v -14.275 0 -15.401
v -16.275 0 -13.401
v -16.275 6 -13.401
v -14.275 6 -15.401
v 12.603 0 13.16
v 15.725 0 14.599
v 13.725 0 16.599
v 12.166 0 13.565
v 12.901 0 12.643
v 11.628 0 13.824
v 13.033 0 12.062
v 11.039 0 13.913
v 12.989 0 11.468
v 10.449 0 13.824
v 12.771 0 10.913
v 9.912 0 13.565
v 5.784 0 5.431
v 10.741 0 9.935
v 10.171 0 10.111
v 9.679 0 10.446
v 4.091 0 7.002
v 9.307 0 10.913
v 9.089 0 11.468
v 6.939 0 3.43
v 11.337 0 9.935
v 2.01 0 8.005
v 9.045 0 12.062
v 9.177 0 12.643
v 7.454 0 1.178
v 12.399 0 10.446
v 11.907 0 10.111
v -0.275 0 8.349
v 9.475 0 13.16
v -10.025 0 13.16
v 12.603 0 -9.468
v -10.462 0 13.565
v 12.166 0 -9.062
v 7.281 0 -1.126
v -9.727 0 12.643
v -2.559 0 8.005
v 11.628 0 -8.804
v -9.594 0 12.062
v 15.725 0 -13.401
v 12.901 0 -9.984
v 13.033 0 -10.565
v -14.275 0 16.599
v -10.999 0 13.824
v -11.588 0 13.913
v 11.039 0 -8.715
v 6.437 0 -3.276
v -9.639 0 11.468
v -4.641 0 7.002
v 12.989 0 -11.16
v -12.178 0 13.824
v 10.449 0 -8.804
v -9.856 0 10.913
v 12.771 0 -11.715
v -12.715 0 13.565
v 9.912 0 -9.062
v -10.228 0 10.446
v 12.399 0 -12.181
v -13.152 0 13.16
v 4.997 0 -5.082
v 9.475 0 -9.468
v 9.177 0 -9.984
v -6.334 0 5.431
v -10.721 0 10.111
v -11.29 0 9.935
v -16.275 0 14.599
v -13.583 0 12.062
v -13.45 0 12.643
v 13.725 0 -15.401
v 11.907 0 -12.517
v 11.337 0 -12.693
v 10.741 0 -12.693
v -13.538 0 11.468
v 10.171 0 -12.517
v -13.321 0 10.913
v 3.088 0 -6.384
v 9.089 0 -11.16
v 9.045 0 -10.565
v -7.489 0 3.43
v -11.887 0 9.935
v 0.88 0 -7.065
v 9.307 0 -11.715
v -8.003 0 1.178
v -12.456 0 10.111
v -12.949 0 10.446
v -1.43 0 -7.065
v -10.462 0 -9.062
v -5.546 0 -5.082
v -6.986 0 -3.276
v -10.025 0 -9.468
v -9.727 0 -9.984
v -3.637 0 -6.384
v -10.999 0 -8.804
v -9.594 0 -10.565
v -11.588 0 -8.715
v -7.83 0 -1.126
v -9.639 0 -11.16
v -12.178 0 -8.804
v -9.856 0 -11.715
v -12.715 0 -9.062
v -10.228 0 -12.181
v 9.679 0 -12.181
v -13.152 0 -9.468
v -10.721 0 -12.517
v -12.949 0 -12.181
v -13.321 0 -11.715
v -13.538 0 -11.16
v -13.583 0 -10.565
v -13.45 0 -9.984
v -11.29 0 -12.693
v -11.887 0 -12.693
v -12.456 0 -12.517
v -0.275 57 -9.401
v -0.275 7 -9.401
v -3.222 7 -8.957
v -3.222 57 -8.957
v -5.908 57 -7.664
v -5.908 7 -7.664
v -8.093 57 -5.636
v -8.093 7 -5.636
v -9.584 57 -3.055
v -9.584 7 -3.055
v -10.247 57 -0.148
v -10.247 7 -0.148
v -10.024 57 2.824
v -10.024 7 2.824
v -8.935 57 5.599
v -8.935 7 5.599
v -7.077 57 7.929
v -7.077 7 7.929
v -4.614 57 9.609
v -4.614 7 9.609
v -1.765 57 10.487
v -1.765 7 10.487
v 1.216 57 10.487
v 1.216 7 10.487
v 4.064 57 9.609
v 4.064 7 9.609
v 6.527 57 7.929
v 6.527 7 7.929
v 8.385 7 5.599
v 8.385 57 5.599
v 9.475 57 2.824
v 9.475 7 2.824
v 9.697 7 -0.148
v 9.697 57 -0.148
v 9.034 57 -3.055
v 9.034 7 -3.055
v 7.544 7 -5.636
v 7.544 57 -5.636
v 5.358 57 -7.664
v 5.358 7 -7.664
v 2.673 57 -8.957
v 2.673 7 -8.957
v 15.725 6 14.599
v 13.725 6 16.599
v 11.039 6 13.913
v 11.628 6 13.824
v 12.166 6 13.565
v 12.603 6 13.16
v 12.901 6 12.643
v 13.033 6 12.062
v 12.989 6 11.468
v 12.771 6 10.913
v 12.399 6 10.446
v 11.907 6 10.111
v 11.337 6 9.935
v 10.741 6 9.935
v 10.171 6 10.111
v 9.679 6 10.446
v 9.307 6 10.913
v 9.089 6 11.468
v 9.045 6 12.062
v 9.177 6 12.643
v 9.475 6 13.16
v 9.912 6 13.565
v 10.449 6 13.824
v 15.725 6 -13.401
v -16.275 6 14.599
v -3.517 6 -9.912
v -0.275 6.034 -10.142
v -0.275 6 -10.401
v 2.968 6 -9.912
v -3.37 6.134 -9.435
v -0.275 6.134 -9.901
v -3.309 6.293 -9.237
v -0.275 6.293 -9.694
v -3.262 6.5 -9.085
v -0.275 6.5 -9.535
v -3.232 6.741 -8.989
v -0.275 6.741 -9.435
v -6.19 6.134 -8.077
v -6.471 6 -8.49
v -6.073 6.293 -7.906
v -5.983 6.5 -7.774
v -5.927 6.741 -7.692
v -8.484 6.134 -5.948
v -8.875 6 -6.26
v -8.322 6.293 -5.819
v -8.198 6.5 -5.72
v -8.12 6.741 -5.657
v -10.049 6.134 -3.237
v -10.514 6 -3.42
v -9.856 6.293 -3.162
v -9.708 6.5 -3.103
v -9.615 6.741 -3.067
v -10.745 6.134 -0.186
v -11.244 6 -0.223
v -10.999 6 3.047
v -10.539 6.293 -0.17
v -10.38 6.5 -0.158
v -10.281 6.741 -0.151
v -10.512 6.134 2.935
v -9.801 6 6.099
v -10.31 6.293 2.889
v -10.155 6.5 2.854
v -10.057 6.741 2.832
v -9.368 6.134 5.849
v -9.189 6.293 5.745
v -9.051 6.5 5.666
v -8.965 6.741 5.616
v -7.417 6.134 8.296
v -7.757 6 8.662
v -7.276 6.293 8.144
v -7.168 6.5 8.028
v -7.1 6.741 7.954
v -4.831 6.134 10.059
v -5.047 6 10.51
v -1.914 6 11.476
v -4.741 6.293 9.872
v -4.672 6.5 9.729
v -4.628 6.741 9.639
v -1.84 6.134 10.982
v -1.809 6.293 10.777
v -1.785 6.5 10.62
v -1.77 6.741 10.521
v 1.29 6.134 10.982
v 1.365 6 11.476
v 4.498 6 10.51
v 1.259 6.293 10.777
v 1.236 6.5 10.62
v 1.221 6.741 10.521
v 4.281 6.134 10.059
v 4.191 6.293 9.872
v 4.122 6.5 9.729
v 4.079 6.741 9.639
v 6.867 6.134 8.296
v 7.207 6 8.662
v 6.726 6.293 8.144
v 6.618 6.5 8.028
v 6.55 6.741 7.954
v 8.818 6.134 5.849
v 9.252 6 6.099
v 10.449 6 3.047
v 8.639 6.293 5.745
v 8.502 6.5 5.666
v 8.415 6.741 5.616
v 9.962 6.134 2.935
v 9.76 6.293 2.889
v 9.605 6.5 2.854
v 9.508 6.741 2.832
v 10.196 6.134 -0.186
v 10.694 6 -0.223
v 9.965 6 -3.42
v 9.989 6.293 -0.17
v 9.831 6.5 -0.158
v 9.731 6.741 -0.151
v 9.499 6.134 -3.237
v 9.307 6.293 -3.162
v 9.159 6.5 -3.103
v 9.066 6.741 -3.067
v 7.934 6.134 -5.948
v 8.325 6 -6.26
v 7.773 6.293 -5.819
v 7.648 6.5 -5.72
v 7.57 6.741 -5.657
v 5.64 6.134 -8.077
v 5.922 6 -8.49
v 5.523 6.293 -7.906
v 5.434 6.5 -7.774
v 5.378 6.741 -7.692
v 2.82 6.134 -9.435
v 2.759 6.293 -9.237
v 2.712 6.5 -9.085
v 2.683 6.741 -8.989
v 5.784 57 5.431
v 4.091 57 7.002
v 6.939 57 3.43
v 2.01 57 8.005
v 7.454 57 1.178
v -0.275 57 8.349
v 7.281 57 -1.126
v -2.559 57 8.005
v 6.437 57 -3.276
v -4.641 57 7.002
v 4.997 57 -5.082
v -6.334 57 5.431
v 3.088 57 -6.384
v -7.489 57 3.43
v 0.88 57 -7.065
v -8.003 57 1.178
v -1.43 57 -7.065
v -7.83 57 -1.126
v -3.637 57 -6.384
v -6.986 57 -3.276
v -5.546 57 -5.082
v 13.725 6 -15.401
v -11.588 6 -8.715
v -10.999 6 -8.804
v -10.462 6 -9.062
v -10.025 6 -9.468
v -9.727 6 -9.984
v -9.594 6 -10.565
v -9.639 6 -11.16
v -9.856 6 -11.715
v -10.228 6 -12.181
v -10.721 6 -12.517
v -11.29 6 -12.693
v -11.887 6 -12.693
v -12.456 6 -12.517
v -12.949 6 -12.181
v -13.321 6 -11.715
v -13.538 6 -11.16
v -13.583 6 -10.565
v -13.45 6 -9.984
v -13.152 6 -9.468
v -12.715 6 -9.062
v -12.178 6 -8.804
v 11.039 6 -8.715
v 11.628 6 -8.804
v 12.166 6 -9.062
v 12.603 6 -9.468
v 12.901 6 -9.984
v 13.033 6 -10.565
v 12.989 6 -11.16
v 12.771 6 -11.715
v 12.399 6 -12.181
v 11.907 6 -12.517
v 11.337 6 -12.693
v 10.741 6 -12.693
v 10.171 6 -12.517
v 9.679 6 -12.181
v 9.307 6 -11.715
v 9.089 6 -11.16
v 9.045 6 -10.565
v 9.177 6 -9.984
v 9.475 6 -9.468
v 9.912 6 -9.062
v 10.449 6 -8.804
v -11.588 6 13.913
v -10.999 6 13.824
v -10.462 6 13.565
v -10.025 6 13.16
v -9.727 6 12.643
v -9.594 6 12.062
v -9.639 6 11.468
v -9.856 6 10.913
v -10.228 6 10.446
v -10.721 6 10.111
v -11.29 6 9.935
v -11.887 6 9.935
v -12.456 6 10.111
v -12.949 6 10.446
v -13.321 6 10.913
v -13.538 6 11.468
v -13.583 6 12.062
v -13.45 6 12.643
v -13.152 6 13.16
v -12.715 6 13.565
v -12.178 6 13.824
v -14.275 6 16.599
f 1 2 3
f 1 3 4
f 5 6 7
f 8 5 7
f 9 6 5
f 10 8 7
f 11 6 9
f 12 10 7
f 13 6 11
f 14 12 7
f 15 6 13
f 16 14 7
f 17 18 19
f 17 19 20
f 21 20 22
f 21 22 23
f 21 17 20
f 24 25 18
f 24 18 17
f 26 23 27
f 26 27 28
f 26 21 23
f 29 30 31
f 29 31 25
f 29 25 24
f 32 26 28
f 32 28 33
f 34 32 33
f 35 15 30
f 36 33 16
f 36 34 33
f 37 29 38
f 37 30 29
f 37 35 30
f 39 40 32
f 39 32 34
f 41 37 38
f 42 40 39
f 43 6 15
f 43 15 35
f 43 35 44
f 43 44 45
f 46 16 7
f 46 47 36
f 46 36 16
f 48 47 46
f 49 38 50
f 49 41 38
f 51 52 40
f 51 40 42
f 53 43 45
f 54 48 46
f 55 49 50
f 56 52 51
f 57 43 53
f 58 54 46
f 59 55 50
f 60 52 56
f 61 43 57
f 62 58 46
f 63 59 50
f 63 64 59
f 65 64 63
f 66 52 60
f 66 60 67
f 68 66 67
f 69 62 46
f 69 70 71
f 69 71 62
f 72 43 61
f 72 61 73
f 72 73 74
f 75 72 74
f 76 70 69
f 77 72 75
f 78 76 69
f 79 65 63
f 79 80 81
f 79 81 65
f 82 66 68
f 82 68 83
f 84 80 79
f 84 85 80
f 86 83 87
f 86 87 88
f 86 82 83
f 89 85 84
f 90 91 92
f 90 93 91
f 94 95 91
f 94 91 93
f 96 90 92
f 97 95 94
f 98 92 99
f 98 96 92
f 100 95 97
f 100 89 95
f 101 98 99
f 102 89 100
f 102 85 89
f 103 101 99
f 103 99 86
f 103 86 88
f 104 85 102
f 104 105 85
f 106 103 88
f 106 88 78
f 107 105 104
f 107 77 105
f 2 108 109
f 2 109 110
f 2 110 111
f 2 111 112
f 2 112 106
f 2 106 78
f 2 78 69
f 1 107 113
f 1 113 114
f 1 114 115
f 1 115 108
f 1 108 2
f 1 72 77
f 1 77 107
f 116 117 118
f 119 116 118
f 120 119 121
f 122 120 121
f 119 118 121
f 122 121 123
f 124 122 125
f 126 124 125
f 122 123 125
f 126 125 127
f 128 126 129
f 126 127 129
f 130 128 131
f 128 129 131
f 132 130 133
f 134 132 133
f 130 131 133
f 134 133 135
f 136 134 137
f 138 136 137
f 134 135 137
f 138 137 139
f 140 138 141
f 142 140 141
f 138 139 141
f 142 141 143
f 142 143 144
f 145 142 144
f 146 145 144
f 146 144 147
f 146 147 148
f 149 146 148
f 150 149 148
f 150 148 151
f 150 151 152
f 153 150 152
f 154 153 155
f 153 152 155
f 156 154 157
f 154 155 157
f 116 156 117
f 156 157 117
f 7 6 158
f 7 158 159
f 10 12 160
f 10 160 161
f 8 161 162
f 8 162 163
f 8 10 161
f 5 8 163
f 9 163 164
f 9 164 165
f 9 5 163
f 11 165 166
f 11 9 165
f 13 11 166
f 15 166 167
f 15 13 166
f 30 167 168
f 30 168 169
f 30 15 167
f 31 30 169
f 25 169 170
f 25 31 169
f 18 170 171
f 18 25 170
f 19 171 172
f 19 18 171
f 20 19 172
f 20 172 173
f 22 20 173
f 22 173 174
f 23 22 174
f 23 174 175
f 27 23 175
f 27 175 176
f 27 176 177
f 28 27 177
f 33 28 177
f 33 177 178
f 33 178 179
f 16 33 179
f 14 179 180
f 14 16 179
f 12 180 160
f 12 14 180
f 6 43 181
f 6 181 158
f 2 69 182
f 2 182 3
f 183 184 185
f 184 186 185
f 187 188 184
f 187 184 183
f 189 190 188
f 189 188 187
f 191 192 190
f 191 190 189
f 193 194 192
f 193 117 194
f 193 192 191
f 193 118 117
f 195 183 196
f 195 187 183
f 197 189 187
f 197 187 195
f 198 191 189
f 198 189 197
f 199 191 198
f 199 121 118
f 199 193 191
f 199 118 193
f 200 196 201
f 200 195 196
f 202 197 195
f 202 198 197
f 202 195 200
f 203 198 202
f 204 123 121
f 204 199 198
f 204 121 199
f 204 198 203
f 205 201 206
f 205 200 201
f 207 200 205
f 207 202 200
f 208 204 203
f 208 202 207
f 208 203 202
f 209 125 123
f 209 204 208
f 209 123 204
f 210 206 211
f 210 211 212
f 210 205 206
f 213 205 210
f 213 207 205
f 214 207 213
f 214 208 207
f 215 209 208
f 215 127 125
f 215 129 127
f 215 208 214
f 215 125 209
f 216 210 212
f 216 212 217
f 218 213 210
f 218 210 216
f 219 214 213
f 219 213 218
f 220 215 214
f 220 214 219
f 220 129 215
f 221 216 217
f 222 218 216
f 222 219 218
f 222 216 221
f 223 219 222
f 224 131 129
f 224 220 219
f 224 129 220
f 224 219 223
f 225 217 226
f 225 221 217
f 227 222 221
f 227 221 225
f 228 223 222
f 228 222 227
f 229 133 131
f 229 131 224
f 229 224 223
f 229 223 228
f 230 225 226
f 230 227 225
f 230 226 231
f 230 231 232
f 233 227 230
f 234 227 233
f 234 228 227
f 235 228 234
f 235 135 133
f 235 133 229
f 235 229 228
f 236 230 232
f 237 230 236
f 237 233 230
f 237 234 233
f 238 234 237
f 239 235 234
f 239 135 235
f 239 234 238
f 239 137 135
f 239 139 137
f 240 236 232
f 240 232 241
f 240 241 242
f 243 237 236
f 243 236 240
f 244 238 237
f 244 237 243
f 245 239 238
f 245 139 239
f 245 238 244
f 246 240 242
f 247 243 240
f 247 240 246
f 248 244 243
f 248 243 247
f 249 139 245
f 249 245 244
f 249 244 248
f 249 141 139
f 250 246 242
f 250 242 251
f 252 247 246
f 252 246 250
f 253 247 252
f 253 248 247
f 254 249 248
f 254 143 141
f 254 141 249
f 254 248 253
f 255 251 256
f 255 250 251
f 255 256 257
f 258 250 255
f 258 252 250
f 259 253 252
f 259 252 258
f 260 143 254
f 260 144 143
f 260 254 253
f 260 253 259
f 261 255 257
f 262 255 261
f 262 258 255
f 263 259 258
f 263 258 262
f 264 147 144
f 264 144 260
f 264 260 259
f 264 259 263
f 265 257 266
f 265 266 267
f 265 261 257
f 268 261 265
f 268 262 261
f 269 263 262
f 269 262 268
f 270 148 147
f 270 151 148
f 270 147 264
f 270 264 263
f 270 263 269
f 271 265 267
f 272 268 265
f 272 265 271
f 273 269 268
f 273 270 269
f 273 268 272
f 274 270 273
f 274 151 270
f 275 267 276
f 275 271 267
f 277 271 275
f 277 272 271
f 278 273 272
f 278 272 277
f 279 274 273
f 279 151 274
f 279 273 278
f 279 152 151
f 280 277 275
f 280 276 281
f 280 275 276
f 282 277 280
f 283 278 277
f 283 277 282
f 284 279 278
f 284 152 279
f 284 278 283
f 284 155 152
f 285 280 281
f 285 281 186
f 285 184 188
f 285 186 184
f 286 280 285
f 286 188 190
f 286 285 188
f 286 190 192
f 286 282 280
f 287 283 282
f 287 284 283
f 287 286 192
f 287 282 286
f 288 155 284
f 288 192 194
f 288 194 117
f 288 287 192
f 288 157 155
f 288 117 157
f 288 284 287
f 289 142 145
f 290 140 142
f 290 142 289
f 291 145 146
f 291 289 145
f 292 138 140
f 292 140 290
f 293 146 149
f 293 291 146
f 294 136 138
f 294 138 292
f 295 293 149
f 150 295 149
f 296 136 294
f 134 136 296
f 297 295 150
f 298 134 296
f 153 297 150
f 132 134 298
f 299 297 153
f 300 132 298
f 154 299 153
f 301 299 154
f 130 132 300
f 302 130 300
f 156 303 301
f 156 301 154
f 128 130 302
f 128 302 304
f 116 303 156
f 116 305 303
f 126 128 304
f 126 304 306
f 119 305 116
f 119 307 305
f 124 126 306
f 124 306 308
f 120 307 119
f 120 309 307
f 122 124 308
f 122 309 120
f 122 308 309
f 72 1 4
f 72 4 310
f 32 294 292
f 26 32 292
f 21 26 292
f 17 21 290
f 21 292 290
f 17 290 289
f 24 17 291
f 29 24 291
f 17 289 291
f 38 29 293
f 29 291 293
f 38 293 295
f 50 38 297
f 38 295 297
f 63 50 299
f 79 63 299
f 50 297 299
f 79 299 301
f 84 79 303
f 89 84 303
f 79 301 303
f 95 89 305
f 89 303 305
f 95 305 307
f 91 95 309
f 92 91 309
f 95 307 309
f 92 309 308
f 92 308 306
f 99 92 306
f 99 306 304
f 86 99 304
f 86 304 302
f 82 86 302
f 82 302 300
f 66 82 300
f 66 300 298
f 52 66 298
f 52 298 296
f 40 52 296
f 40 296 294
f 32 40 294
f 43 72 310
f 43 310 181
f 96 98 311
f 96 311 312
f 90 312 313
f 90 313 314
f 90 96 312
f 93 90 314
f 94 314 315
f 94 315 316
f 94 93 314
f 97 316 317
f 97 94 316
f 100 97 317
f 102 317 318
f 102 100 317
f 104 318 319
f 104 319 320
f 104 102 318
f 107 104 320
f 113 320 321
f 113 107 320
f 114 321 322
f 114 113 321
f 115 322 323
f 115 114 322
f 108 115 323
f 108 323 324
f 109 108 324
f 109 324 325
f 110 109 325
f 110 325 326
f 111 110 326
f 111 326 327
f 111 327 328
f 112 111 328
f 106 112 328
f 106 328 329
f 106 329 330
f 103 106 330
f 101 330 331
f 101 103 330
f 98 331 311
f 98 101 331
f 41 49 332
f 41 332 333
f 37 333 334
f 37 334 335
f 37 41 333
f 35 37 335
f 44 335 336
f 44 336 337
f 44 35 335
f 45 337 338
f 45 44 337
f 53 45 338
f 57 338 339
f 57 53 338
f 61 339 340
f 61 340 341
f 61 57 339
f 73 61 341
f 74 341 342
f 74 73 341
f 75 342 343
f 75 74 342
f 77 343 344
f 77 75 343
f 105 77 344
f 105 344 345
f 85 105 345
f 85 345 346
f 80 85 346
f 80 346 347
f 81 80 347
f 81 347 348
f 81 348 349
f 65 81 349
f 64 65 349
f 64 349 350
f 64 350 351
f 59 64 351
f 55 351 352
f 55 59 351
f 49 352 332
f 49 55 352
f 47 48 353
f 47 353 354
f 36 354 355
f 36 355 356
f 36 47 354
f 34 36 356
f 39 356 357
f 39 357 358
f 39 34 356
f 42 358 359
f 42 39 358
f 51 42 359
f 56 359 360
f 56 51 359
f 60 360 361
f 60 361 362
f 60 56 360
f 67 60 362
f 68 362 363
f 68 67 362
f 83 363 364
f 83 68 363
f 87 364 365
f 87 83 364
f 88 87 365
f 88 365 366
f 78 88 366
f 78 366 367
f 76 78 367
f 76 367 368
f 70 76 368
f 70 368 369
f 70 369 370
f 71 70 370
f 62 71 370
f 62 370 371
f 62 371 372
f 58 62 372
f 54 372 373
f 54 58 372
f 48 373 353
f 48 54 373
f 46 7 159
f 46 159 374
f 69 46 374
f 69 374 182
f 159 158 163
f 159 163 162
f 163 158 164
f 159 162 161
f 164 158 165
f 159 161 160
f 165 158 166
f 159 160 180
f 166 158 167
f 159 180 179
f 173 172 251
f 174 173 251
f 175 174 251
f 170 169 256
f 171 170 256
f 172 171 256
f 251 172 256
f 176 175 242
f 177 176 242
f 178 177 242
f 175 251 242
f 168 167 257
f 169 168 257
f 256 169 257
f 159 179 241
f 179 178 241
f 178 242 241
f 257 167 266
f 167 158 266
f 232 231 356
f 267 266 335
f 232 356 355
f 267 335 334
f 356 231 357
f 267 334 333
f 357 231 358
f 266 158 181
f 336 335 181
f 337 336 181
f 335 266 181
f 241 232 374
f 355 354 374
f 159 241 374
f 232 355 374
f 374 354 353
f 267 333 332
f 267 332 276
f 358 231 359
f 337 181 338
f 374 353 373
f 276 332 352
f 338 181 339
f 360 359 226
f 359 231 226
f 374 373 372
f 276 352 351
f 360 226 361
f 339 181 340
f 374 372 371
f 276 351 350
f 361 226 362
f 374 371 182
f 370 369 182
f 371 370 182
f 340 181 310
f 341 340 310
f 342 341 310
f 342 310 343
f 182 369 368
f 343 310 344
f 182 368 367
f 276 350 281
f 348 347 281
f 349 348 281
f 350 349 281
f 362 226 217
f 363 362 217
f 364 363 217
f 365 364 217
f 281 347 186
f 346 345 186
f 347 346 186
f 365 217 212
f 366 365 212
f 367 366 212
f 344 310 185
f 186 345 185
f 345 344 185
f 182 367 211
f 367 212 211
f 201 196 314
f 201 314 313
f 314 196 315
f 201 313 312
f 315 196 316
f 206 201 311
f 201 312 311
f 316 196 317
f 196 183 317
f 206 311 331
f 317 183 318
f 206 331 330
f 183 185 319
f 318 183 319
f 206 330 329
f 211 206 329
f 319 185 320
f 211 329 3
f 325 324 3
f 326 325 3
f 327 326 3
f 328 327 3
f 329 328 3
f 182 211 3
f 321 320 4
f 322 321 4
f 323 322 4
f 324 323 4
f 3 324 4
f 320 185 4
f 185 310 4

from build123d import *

# Parameters (mm, degrees)
SKETCH1_R           = 2
BOSS_EXTRUDE1_DEPTH = 6
SKETCH2_R           = 10
BOSS_EXTRUDE2_DEPTH = 51
SKETCH3_R           = 7.75
CUT_EXTRUDE1_DEPTH  = 62.558024733
FILLET1_R           = 1


with BuildPart() as part:
    # Sketch1 → Boss-Extrude1 (new body)
    with BuildSketch(Plane(origin=(0, 0, 0), x_dir=(1, 0, 0), z_dir=(0, 1, 0))):
        Polygon((-16.274775851, 13.401142209), (-14.274775851, 15.401142209), (13.725224149, 15.401142209), (15.725224149, 13.401142209), (15.725224149, -14.598857791), (13.725224149, -16.598857791), (-14.274775851, -16.598857791), (-16.274775851, -14.598857791), align=None)
        with Locations(Location((11.038932647, 10.714850708, 0), (0, 0, 270))):
            Circle(SKETCH1_R, mode=Mode.SUBTRACT)
        with Locations(Location((-11.58848435, 10.714850708, 0), (0, 0, 270))):
            Circle(SKETCH1_R, mode=Mode.SUBTRACT)
        with Locations(Location((-11.58848435, -11.91256629, 0), (0, 0, 270))):
            Circle(SKETCH1_R, mode=Mode.SUBTRACT)
        with Locations(Location((11.038932647, -11.91256629, 0), (0, 0, 270))):
            Circle(SKETCH1_R, mode=Mode.SUBTRACT)
    extrude(amount=BOSS_EXTRUDE1_DEPTH)

    # Sketch2 → Boss-Extrude2 (add)
    with BuildSketch(Plane(origin=(0, 6, 0), x_dir=(1, 0, 0), z_dir=(0, 1, 0))):
        with Locations(Location((-0.274775851, -0.598857791, 0), (0, 0, 90))):
            Circle(SKETCH2_R)
    extrude(amount=BOSS_EXTRUDE2_DEPTH)

    # Sketch3 → Cut-Extrude1 (cut, through all)
    with BuildSketch(Plane(origin=(0, 57, 0), x_dir=(1, 0, 0), z_dir=(0, 1, 0))):
        with Locations(Location((-0.274775851, -0.598857791, 0), (0, 0, 270))):
            Circle(SKETCH3_R)
    extrude(amount=-CUT_EXTRUDE1_DEPTH, mode=Mode.SUBTRACT)

    # Fillet1
    fillet1_edges = [part.edges().sort_by_distance(p)[0] for p in [
        (-0.274775851, 6, 10.598857791),
    ]]
    fillet(fillet1_edges, radius=FILLET1_R)


solid = part.part
